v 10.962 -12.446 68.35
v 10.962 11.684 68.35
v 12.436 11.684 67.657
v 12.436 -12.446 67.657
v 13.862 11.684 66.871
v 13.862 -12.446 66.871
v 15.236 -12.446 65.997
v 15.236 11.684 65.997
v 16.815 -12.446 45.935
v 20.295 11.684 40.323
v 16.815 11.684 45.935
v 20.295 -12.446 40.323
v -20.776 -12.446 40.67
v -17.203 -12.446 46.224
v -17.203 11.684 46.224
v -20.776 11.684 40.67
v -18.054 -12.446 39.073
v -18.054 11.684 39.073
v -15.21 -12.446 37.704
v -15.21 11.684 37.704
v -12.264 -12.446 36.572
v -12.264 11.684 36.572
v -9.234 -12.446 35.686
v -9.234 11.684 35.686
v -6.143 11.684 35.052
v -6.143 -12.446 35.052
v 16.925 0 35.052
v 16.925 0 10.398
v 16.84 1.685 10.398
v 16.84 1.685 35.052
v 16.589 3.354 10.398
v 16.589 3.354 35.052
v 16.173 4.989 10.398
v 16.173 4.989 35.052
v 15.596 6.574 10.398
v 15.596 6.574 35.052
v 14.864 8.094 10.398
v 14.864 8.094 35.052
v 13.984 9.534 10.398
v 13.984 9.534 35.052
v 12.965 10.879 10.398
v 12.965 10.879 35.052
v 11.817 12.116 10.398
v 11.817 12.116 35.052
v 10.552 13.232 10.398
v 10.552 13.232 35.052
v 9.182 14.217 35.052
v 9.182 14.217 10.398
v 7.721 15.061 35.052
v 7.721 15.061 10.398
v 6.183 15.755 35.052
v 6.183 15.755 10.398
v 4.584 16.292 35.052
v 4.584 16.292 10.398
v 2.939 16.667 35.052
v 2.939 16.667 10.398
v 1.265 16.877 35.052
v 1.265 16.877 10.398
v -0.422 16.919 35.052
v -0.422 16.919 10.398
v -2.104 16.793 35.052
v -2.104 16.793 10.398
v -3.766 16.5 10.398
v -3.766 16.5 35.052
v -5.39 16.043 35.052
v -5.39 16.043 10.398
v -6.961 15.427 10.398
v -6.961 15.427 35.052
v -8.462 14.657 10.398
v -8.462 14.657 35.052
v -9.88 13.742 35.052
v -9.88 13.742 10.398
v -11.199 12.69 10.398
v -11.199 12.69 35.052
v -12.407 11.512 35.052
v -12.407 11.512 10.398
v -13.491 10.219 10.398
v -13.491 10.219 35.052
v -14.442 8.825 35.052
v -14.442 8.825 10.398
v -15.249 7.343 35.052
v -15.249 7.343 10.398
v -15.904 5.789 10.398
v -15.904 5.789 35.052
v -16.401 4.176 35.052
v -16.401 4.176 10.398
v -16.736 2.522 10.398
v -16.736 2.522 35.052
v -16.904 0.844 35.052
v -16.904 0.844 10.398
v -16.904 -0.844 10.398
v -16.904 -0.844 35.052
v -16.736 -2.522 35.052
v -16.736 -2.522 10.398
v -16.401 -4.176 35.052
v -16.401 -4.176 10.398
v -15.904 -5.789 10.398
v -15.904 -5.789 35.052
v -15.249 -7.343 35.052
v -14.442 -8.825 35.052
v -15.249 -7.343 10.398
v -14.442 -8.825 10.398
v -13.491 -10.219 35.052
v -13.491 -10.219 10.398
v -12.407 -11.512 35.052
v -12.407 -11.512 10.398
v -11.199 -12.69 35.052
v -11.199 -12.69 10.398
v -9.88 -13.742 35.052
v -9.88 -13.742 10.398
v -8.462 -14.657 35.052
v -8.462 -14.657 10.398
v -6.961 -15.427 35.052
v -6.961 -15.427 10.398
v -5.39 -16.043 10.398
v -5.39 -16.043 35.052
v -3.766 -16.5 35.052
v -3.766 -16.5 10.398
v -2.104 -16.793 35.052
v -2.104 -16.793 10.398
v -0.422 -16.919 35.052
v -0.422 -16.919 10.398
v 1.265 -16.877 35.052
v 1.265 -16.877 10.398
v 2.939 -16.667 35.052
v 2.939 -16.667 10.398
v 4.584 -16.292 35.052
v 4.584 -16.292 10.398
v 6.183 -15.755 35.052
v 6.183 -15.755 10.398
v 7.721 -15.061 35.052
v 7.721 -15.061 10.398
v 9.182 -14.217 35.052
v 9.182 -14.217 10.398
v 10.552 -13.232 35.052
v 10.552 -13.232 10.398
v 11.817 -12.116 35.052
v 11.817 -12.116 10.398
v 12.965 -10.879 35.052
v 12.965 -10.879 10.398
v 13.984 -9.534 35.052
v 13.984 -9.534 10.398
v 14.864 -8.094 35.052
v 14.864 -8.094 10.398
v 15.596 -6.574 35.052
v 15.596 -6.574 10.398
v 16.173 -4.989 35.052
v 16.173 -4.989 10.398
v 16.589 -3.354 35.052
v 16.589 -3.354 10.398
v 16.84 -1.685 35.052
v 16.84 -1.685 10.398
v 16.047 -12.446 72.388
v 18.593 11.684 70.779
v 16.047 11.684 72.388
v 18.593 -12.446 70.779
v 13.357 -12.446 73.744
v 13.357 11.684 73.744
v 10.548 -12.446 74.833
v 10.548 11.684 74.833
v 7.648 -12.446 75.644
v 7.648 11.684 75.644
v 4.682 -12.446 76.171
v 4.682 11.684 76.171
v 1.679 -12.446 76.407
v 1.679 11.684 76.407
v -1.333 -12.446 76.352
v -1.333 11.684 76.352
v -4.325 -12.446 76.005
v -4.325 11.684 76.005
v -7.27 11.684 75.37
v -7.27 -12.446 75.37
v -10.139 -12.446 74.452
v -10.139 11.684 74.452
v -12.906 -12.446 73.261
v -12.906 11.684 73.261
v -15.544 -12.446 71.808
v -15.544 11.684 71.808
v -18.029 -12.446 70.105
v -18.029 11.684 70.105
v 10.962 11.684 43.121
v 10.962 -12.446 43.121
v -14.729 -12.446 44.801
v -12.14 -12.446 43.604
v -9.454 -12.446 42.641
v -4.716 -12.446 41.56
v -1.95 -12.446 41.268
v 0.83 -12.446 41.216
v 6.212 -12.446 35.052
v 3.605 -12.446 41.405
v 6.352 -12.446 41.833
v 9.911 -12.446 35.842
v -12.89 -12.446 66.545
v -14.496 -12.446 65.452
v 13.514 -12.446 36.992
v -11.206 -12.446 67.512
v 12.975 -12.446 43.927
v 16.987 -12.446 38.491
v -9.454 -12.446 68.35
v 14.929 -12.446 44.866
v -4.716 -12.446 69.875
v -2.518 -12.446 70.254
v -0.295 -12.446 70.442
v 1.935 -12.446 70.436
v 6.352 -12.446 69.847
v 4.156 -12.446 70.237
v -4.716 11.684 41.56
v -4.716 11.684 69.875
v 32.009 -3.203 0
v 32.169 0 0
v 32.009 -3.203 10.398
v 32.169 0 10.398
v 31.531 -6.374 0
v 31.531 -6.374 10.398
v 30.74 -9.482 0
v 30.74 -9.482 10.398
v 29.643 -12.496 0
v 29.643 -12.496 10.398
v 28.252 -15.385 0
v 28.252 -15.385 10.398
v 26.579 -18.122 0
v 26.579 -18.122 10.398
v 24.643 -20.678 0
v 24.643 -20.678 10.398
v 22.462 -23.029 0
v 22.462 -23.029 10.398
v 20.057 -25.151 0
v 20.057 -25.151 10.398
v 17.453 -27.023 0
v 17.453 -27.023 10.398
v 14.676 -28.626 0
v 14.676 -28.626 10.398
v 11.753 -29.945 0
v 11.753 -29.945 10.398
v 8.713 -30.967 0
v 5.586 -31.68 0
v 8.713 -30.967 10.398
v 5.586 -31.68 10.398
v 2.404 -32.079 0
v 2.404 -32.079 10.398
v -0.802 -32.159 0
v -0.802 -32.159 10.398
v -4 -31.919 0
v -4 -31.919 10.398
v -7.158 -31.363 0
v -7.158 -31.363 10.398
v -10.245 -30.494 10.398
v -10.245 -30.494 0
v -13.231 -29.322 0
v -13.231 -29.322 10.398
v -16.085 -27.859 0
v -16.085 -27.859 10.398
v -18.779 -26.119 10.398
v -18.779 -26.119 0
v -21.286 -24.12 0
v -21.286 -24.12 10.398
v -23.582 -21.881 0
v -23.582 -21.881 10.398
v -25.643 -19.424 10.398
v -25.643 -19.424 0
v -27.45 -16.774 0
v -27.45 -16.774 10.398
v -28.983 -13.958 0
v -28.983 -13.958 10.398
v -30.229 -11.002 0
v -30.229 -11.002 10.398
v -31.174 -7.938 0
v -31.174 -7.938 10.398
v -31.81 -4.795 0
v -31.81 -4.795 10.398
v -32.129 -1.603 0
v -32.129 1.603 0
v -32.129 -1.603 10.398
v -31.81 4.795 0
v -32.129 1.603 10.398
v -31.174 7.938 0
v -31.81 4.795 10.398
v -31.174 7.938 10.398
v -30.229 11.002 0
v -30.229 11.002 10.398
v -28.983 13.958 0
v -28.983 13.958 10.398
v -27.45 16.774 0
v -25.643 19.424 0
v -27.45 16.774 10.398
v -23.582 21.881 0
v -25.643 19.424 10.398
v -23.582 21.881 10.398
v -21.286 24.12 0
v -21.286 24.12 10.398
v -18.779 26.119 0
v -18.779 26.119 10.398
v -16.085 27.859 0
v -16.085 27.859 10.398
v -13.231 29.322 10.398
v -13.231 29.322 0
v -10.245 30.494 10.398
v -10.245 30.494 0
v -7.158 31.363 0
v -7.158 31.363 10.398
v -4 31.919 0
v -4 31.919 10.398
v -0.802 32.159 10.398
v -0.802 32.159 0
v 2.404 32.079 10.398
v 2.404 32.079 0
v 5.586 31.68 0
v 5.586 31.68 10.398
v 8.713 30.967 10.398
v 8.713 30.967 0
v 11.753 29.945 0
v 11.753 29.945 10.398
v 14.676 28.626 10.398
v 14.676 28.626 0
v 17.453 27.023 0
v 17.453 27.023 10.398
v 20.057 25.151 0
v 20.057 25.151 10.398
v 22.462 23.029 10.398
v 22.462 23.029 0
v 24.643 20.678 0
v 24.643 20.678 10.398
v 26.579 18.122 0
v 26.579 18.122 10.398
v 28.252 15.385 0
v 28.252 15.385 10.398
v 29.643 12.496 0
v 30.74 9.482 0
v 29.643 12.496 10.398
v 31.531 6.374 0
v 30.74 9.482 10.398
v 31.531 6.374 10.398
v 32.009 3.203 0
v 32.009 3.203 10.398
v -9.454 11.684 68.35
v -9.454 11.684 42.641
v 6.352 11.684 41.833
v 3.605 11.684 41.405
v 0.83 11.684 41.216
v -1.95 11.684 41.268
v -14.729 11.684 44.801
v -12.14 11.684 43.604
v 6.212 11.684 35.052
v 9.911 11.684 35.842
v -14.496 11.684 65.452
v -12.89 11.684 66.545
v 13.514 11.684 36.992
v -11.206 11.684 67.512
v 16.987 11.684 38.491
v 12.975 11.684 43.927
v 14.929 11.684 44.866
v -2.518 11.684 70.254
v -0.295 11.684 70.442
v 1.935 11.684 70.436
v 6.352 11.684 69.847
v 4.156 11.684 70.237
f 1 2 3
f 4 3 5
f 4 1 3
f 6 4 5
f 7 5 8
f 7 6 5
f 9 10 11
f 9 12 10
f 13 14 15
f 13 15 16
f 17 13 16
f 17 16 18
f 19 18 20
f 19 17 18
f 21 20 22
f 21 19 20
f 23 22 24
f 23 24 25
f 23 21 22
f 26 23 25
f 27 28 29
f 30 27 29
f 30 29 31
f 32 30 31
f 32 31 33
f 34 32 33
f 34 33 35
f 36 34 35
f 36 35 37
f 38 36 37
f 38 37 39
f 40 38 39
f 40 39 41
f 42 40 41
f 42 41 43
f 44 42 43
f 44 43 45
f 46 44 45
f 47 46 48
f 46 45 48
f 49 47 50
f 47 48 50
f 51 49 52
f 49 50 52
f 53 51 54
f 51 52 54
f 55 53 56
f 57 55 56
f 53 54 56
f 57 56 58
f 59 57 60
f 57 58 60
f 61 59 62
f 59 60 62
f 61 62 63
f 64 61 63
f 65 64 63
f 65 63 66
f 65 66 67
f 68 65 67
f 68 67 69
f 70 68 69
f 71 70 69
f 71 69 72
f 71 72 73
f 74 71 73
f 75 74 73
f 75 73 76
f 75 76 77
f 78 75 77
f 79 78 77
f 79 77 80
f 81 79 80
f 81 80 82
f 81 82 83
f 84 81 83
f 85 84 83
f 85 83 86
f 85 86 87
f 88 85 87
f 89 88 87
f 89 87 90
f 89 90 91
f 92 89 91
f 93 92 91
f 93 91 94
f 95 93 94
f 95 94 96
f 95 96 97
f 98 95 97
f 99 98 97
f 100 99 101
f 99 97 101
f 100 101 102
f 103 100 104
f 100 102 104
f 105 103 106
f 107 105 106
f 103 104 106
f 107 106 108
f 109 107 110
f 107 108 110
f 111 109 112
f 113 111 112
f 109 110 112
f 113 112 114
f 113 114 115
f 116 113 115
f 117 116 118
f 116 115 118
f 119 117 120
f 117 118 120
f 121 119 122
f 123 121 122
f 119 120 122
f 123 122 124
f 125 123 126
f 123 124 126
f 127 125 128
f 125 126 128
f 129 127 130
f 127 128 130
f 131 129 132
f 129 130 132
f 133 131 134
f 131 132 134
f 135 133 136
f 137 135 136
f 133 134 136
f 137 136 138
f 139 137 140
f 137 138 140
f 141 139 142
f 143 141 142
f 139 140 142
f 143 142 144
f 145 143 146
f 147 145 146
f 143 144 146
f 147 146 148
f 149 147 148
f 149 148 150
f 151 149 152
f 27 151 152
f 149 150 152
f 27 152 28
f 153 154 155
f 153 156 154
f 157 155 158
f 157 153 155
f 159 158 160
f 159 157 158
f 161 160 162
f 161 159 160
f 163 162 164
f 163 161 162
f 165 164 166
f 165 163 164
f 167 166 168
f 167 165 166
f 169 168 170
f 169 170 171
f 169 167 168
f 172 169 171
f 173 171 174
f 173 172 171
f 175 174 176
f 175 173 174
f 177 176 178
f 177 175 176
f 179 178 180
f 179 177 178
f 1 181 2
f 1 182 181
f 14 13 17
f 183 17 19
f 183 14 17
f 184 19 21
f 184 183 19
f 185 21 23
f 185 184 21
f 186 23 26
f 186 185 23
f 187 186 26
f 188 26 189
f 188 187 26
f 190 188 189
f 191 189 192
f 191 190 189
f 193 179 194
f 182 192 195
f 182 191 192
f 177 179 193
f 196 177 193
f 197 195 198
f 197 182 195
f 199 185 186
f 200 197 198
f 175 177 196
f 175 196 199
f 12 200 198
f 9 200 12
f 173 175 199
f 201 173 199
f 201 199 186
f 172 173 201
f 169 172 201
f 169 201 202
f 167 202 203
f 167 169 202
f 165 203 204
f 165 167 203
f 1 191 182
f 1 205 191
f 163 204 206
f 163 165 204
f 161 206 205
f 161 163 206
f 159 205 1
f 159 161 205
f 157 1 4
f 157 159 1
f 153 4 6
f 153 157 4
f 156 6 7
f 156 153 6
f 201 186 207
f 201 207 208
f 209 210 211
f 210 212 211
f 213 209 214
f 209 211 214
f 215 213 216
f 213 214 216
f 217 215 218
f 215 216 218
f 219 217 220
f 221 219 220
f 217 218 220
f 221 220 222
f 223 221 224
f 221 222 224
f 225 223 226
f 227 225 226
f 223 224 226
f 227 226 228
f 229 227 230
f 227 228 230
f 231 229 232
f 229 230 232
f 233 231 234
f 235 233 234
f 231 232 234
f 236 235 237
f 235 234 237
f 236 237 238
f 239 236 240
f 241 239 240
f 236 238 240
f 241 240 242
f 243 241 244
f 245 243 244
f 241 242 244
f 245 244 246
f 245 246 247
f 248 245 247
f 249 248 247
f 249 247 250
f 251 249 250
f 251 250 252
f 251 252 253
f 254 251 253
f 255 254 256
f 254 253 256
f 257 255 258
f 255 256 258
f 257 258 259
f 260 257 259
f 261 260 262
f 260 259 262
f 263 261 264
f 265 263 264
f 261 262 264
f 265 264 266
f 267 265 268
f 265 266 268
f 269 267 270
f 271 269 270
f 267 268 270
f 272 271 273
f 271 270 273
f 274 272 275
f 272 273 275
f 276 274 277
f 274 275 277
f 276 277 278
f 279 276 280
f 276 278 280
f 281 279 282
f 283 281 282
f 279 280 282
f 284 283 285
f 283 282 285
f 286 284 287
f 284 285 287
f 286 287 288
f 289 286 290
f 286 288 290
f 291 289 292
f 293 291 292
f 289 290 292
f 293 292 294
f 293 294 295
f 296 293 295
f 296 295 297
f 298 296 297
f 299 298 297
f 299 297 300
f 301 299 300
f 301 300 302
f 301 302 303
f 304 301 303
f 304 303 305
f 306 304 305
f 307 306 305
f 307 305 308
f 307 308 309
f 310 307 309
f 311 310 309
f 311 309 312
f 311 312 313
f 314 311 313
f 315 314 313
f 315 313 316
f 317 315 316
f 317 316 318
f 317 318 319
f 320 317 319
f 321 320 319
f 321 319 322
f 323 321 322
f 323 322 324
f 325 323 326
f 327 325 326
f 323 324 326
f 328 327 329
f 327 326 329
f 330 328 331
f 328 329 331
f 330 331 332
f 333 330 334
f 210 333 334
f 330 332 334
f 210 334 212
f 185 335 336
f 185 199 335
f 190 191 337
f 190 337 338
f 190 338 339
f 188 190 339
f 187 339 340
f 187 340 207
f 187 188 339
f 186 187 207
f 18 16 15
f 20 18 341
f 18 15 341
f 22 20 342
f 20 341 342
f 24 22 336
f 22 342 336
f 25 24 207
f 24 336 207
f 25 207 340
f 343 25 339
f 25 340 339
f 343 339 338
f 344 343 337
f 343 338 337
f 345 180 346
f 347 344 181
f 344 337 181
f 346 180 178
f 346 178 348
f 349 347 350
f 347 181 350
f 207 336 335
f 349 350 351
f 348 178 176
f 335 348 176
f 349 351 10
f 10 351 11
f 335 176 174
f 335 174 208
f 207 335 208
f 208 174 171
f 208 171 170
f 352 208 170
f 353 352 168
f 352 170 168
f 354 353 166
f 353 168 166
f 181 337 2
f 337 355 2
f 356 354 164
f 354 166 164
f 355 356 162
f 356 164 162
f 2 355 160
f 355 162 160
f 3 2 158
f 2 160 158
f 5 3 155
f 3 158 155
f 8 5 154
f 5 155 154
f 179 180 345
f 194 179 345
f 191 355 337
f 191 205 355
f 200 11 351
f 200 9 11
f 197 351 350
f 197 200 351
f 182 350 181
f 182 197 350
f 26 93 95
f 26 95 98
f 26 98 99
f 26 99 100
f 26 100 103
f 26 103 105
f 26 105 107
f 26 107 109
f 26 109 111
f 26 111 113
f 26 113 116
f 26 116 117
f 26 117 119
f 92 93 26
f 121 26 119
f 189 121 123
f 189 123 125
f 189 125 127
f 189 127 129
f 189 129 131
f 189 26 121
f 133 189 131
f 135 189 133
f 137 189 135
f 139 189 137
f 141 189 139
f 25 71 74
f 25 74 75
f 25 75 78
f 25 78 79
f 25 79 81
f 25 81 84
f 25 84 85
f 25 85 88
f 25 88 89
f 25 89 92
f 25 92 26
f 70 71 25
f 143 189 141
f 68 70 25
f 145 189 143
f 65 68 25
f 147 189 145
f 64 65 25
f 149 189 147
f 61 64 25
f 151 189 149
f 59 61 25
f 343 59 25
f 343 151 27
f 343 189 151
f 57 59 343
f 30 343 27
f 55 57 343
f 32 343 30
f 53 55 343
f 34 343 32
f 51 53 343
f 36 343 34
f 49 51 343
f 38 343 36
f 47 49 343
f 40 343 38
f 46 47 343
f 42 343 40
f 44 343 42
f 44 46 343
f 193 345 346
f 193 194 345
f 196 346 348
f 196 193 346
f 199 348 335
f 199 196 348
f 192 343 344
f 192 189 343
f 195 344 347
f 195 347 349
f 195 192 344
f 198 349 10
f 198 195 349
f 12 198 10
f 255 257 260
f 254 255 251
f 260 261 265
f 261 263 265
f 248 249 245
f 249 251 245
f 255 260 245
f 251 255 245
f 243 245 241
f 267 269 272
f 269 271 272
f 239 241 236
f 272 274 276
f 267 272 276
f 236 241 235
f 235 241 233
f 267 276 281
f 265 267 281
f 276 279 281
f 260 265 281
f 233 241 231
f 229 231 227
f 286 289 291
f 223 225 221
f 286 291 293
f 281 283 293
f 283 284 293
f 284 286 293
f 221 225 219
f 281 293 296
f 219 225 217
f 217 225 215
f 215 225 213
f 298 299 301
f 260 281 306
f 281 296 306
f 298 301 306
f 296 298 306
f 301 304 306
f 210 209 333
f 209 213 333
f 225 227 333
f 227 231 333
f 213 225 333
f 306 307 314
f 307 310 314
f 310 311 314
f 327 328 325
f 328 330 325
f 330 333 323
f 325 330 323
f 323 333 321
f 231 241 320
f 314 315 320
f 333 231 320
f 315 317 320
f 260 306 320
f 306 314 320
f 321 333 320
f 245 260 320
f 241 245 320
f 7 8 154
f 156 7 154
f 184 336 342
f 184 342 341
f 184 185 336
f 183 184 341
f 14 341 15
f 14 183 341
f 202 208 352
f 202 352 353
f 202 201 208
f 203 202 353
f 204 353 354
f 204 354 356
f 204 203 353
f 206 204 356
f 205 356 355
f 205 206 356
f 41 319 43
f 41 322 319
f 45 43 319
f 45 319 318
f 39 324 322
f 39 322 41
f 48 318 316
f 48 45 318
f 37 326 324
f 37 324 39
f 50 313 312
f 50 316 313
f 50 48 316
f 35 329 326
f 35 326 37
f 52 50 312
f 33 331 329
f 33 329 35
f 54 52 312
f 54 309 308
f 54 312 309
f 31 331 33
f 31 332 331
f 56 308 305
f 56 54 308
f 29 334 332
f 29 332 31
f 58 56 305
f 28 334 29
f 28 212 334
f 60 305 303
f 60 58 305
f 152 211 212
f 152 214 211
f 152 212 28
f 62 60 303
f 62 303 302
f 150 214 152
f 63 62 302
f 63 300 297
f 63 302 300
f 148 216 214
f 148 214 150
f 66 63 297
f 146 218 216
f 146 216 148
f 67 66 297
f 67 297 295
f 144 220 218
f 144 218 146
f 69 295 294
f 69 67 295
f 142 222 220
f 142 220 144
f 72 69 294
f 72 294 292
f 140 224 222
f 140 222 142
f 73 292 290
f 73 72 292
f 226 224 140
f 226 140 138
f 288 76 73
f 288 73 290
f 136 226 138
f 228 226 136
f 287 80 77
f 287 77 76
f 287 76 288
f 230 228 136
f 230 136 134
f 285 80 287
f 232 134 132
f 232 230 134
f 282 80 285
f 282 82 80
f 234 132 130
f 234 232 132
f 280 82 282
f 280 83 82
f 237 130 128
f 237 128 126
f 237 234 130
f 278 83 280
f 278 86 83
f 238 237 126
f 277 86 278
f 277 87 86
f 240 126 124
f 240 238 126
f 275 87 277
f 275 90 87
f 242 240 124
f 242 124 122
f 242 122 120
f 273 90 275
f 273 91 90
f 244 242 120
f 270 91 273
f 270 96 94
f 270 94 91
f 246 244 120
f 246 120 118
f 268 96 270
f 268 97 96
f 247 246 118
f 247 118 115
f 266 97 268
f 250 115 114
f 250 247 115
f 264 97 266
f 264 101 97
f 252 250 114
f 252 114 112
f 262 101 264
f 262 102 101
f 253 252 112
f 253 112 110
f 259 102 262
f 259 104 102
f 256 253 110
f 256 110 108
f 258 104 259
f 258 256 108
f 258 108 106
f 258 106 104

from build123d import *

# Parameters (mm, degrees)
F0_W     = 32.1691036224
F0_H     = 10.3981345892
F2_R     = 16.9245679208
F3_DEPTH = 35.052
F5_DEPTH = 12.446
F6_DEPTH = 11.684


with BuildPart() as f1:
    # F0 (on Front) → F1 (revolve)
    with BuildSketch(Plane.XZ):
        with Locations((16.0845518112, 5.1990672946)):
            Rectangle(F0_W, F0_H)
    revolve(axis=Axis((0, 0, 5.1990672946), (0, 0, -1)))

    # F2 (on Top) → F3 (join)
    with BuildSketch(Plane.XY):
        Circle(F2_R)
    extrude(amount=F3_DEPTH)

    # F4 (on Front) → F5 (join)
    with BuildSketch(Plane.XZ):
        with BuildLine():
            Line((-17.2026802681, 46.2241524707), (-20.7758424342, 40.6702971151))
            ThreePointArc((-20.7758424342, 40.6702971151), (-0.2905255832, 34.5539512873), (20.2953913573, 40.3226527435))
            Line((20.2953913573, 40.3226527435), (16.8152843817, 45.9352860484))
            ThreePointArc((16.8152843817, 45.9352860484), (-0.2354935112, 41.1577205632), (-17.2026802681, 46.2241524707))
        make_face()
        with BuildLine():
            ThreePointArc((-9.4536782582, 42.6405122732), (-13.4477491949, 44.1737830783), (-17.2026802681, 46.2241524707))
            ThreePointArc((-17.2026802681, 46.2241524707), (-0.2354935112, 41.1577205632), (16.8152843817, 45.9352860484))
            ThreePointArc((16.8152843817, 45.9352860484), (13.9600425927, 44.3798005754), (10.962201674, 43.1208762102))
            ThreePointArc((10.962201674, 43.1208762102), (8.6813208555, 42.3910598969), (6.3524134113, 41.833171668))
            ThreePointArc((6.3524134113, 41.833171668), (0.8301071261, 41.2162515517), (-4.7159024645, 41.5601043652))
            ThreePointArc((-4.7159024645, 41.5601043652), (-7.1052467262, 42.0106036166), (-9.4536782582, 42.6405122732))
        make_face()
        with BuildLine():
            Line((-9.4536782582, 68.3503676295), (-9.4536782582, 42.6405122732))
            ThreePointArc((-9.4536782582, 42.6405122732), (-7.1052467262, 42.0106036166), (-4.7159024645, 41.5601043652))
            Line((-4.7159024645, 41.5601043652), (-4.7159024645, 69.8749349594))
            ThreePointArc((-4.7159024645, 69.8749349594), (-7.1217660809, 69.2275577769), (-9.4536782582, 68.3503676295))
        make_face()
        with BuildLine():
            ThreePointArc((6.3524134113, 41.833171668), (8.6813208555, 42.3910598969), (10.962201674, 43.1208762102))
            Line((10.962201674, 43.1208762102), (10.962201674, 68.3503676295))
            ThreePointArc((10.962201674, 68.3503676295), (8.6926434954, 69.2074051813), (6.3524134113, 69.8467257929))
            Line((6.3524134113, 69.8467257929), (6.3524134113, 41.833171668))
        make_face()
        with BuildLine():
            ThreePointArc((-14.4961847769, 65.4524759376), (-12.0571318242, 67.0444552804), (-9.4536782582, 68.3503676295))
            ThreePointArc((-9.4536782582, 68.3503676295), (-7.1217660809, 69.2275577769), (-4.7159024645, 69.8749349594))
            ThreePointArc((-4.7159024645, 69.8749349594), (0.8197914056, 70.4634778759), (6.3524134113, 69.8467257929))
            ThreePointArc((6.3524134113, 69.8467257929), (8.6926434954, 69.2074051813), (10.962201674, 68.3503676295))
            ThreePointArc((10.962201674, 68.3503676295), (13.155285497, 67.2753192406), (15.2364689754, 65.9970309232))
            ThreePointArc((15.2364689754, 65.9970309232), (0.2813076758, 70.5751050434), (-14.4961847769, 65.4524759376))
        make_face()
        with BuildLine():
            Line((-18.0290771655, 70.1051802942), (-14.4961847769, 65.4524759376))
            ThreePointArc((-14.4961847769, 65.4524759376), (0.2813076758, 70.5751050434), (15.2364689754, 65.9970309232))
            Line((15.2364689754, 65.9970309232), (18.5930212877, 70.7785100912))
            ThreePointArc((18.5930212877, 70.7785100912), (0.1721303263, 76.4160867046), (-18.0290771655, 70.1051802942))
        make_face()
    extrude(amount=F5_DEPTH)

    # F6 (add): a face of the model
    f6_faces = [f1.faces().sort_by_distance(p)[0] for p in [
        (-13.6924417201, 0, 43.6446778209),
    ]]
    extrude(f6_faces, amount=F6_DEPTH)


solid = f1.part
